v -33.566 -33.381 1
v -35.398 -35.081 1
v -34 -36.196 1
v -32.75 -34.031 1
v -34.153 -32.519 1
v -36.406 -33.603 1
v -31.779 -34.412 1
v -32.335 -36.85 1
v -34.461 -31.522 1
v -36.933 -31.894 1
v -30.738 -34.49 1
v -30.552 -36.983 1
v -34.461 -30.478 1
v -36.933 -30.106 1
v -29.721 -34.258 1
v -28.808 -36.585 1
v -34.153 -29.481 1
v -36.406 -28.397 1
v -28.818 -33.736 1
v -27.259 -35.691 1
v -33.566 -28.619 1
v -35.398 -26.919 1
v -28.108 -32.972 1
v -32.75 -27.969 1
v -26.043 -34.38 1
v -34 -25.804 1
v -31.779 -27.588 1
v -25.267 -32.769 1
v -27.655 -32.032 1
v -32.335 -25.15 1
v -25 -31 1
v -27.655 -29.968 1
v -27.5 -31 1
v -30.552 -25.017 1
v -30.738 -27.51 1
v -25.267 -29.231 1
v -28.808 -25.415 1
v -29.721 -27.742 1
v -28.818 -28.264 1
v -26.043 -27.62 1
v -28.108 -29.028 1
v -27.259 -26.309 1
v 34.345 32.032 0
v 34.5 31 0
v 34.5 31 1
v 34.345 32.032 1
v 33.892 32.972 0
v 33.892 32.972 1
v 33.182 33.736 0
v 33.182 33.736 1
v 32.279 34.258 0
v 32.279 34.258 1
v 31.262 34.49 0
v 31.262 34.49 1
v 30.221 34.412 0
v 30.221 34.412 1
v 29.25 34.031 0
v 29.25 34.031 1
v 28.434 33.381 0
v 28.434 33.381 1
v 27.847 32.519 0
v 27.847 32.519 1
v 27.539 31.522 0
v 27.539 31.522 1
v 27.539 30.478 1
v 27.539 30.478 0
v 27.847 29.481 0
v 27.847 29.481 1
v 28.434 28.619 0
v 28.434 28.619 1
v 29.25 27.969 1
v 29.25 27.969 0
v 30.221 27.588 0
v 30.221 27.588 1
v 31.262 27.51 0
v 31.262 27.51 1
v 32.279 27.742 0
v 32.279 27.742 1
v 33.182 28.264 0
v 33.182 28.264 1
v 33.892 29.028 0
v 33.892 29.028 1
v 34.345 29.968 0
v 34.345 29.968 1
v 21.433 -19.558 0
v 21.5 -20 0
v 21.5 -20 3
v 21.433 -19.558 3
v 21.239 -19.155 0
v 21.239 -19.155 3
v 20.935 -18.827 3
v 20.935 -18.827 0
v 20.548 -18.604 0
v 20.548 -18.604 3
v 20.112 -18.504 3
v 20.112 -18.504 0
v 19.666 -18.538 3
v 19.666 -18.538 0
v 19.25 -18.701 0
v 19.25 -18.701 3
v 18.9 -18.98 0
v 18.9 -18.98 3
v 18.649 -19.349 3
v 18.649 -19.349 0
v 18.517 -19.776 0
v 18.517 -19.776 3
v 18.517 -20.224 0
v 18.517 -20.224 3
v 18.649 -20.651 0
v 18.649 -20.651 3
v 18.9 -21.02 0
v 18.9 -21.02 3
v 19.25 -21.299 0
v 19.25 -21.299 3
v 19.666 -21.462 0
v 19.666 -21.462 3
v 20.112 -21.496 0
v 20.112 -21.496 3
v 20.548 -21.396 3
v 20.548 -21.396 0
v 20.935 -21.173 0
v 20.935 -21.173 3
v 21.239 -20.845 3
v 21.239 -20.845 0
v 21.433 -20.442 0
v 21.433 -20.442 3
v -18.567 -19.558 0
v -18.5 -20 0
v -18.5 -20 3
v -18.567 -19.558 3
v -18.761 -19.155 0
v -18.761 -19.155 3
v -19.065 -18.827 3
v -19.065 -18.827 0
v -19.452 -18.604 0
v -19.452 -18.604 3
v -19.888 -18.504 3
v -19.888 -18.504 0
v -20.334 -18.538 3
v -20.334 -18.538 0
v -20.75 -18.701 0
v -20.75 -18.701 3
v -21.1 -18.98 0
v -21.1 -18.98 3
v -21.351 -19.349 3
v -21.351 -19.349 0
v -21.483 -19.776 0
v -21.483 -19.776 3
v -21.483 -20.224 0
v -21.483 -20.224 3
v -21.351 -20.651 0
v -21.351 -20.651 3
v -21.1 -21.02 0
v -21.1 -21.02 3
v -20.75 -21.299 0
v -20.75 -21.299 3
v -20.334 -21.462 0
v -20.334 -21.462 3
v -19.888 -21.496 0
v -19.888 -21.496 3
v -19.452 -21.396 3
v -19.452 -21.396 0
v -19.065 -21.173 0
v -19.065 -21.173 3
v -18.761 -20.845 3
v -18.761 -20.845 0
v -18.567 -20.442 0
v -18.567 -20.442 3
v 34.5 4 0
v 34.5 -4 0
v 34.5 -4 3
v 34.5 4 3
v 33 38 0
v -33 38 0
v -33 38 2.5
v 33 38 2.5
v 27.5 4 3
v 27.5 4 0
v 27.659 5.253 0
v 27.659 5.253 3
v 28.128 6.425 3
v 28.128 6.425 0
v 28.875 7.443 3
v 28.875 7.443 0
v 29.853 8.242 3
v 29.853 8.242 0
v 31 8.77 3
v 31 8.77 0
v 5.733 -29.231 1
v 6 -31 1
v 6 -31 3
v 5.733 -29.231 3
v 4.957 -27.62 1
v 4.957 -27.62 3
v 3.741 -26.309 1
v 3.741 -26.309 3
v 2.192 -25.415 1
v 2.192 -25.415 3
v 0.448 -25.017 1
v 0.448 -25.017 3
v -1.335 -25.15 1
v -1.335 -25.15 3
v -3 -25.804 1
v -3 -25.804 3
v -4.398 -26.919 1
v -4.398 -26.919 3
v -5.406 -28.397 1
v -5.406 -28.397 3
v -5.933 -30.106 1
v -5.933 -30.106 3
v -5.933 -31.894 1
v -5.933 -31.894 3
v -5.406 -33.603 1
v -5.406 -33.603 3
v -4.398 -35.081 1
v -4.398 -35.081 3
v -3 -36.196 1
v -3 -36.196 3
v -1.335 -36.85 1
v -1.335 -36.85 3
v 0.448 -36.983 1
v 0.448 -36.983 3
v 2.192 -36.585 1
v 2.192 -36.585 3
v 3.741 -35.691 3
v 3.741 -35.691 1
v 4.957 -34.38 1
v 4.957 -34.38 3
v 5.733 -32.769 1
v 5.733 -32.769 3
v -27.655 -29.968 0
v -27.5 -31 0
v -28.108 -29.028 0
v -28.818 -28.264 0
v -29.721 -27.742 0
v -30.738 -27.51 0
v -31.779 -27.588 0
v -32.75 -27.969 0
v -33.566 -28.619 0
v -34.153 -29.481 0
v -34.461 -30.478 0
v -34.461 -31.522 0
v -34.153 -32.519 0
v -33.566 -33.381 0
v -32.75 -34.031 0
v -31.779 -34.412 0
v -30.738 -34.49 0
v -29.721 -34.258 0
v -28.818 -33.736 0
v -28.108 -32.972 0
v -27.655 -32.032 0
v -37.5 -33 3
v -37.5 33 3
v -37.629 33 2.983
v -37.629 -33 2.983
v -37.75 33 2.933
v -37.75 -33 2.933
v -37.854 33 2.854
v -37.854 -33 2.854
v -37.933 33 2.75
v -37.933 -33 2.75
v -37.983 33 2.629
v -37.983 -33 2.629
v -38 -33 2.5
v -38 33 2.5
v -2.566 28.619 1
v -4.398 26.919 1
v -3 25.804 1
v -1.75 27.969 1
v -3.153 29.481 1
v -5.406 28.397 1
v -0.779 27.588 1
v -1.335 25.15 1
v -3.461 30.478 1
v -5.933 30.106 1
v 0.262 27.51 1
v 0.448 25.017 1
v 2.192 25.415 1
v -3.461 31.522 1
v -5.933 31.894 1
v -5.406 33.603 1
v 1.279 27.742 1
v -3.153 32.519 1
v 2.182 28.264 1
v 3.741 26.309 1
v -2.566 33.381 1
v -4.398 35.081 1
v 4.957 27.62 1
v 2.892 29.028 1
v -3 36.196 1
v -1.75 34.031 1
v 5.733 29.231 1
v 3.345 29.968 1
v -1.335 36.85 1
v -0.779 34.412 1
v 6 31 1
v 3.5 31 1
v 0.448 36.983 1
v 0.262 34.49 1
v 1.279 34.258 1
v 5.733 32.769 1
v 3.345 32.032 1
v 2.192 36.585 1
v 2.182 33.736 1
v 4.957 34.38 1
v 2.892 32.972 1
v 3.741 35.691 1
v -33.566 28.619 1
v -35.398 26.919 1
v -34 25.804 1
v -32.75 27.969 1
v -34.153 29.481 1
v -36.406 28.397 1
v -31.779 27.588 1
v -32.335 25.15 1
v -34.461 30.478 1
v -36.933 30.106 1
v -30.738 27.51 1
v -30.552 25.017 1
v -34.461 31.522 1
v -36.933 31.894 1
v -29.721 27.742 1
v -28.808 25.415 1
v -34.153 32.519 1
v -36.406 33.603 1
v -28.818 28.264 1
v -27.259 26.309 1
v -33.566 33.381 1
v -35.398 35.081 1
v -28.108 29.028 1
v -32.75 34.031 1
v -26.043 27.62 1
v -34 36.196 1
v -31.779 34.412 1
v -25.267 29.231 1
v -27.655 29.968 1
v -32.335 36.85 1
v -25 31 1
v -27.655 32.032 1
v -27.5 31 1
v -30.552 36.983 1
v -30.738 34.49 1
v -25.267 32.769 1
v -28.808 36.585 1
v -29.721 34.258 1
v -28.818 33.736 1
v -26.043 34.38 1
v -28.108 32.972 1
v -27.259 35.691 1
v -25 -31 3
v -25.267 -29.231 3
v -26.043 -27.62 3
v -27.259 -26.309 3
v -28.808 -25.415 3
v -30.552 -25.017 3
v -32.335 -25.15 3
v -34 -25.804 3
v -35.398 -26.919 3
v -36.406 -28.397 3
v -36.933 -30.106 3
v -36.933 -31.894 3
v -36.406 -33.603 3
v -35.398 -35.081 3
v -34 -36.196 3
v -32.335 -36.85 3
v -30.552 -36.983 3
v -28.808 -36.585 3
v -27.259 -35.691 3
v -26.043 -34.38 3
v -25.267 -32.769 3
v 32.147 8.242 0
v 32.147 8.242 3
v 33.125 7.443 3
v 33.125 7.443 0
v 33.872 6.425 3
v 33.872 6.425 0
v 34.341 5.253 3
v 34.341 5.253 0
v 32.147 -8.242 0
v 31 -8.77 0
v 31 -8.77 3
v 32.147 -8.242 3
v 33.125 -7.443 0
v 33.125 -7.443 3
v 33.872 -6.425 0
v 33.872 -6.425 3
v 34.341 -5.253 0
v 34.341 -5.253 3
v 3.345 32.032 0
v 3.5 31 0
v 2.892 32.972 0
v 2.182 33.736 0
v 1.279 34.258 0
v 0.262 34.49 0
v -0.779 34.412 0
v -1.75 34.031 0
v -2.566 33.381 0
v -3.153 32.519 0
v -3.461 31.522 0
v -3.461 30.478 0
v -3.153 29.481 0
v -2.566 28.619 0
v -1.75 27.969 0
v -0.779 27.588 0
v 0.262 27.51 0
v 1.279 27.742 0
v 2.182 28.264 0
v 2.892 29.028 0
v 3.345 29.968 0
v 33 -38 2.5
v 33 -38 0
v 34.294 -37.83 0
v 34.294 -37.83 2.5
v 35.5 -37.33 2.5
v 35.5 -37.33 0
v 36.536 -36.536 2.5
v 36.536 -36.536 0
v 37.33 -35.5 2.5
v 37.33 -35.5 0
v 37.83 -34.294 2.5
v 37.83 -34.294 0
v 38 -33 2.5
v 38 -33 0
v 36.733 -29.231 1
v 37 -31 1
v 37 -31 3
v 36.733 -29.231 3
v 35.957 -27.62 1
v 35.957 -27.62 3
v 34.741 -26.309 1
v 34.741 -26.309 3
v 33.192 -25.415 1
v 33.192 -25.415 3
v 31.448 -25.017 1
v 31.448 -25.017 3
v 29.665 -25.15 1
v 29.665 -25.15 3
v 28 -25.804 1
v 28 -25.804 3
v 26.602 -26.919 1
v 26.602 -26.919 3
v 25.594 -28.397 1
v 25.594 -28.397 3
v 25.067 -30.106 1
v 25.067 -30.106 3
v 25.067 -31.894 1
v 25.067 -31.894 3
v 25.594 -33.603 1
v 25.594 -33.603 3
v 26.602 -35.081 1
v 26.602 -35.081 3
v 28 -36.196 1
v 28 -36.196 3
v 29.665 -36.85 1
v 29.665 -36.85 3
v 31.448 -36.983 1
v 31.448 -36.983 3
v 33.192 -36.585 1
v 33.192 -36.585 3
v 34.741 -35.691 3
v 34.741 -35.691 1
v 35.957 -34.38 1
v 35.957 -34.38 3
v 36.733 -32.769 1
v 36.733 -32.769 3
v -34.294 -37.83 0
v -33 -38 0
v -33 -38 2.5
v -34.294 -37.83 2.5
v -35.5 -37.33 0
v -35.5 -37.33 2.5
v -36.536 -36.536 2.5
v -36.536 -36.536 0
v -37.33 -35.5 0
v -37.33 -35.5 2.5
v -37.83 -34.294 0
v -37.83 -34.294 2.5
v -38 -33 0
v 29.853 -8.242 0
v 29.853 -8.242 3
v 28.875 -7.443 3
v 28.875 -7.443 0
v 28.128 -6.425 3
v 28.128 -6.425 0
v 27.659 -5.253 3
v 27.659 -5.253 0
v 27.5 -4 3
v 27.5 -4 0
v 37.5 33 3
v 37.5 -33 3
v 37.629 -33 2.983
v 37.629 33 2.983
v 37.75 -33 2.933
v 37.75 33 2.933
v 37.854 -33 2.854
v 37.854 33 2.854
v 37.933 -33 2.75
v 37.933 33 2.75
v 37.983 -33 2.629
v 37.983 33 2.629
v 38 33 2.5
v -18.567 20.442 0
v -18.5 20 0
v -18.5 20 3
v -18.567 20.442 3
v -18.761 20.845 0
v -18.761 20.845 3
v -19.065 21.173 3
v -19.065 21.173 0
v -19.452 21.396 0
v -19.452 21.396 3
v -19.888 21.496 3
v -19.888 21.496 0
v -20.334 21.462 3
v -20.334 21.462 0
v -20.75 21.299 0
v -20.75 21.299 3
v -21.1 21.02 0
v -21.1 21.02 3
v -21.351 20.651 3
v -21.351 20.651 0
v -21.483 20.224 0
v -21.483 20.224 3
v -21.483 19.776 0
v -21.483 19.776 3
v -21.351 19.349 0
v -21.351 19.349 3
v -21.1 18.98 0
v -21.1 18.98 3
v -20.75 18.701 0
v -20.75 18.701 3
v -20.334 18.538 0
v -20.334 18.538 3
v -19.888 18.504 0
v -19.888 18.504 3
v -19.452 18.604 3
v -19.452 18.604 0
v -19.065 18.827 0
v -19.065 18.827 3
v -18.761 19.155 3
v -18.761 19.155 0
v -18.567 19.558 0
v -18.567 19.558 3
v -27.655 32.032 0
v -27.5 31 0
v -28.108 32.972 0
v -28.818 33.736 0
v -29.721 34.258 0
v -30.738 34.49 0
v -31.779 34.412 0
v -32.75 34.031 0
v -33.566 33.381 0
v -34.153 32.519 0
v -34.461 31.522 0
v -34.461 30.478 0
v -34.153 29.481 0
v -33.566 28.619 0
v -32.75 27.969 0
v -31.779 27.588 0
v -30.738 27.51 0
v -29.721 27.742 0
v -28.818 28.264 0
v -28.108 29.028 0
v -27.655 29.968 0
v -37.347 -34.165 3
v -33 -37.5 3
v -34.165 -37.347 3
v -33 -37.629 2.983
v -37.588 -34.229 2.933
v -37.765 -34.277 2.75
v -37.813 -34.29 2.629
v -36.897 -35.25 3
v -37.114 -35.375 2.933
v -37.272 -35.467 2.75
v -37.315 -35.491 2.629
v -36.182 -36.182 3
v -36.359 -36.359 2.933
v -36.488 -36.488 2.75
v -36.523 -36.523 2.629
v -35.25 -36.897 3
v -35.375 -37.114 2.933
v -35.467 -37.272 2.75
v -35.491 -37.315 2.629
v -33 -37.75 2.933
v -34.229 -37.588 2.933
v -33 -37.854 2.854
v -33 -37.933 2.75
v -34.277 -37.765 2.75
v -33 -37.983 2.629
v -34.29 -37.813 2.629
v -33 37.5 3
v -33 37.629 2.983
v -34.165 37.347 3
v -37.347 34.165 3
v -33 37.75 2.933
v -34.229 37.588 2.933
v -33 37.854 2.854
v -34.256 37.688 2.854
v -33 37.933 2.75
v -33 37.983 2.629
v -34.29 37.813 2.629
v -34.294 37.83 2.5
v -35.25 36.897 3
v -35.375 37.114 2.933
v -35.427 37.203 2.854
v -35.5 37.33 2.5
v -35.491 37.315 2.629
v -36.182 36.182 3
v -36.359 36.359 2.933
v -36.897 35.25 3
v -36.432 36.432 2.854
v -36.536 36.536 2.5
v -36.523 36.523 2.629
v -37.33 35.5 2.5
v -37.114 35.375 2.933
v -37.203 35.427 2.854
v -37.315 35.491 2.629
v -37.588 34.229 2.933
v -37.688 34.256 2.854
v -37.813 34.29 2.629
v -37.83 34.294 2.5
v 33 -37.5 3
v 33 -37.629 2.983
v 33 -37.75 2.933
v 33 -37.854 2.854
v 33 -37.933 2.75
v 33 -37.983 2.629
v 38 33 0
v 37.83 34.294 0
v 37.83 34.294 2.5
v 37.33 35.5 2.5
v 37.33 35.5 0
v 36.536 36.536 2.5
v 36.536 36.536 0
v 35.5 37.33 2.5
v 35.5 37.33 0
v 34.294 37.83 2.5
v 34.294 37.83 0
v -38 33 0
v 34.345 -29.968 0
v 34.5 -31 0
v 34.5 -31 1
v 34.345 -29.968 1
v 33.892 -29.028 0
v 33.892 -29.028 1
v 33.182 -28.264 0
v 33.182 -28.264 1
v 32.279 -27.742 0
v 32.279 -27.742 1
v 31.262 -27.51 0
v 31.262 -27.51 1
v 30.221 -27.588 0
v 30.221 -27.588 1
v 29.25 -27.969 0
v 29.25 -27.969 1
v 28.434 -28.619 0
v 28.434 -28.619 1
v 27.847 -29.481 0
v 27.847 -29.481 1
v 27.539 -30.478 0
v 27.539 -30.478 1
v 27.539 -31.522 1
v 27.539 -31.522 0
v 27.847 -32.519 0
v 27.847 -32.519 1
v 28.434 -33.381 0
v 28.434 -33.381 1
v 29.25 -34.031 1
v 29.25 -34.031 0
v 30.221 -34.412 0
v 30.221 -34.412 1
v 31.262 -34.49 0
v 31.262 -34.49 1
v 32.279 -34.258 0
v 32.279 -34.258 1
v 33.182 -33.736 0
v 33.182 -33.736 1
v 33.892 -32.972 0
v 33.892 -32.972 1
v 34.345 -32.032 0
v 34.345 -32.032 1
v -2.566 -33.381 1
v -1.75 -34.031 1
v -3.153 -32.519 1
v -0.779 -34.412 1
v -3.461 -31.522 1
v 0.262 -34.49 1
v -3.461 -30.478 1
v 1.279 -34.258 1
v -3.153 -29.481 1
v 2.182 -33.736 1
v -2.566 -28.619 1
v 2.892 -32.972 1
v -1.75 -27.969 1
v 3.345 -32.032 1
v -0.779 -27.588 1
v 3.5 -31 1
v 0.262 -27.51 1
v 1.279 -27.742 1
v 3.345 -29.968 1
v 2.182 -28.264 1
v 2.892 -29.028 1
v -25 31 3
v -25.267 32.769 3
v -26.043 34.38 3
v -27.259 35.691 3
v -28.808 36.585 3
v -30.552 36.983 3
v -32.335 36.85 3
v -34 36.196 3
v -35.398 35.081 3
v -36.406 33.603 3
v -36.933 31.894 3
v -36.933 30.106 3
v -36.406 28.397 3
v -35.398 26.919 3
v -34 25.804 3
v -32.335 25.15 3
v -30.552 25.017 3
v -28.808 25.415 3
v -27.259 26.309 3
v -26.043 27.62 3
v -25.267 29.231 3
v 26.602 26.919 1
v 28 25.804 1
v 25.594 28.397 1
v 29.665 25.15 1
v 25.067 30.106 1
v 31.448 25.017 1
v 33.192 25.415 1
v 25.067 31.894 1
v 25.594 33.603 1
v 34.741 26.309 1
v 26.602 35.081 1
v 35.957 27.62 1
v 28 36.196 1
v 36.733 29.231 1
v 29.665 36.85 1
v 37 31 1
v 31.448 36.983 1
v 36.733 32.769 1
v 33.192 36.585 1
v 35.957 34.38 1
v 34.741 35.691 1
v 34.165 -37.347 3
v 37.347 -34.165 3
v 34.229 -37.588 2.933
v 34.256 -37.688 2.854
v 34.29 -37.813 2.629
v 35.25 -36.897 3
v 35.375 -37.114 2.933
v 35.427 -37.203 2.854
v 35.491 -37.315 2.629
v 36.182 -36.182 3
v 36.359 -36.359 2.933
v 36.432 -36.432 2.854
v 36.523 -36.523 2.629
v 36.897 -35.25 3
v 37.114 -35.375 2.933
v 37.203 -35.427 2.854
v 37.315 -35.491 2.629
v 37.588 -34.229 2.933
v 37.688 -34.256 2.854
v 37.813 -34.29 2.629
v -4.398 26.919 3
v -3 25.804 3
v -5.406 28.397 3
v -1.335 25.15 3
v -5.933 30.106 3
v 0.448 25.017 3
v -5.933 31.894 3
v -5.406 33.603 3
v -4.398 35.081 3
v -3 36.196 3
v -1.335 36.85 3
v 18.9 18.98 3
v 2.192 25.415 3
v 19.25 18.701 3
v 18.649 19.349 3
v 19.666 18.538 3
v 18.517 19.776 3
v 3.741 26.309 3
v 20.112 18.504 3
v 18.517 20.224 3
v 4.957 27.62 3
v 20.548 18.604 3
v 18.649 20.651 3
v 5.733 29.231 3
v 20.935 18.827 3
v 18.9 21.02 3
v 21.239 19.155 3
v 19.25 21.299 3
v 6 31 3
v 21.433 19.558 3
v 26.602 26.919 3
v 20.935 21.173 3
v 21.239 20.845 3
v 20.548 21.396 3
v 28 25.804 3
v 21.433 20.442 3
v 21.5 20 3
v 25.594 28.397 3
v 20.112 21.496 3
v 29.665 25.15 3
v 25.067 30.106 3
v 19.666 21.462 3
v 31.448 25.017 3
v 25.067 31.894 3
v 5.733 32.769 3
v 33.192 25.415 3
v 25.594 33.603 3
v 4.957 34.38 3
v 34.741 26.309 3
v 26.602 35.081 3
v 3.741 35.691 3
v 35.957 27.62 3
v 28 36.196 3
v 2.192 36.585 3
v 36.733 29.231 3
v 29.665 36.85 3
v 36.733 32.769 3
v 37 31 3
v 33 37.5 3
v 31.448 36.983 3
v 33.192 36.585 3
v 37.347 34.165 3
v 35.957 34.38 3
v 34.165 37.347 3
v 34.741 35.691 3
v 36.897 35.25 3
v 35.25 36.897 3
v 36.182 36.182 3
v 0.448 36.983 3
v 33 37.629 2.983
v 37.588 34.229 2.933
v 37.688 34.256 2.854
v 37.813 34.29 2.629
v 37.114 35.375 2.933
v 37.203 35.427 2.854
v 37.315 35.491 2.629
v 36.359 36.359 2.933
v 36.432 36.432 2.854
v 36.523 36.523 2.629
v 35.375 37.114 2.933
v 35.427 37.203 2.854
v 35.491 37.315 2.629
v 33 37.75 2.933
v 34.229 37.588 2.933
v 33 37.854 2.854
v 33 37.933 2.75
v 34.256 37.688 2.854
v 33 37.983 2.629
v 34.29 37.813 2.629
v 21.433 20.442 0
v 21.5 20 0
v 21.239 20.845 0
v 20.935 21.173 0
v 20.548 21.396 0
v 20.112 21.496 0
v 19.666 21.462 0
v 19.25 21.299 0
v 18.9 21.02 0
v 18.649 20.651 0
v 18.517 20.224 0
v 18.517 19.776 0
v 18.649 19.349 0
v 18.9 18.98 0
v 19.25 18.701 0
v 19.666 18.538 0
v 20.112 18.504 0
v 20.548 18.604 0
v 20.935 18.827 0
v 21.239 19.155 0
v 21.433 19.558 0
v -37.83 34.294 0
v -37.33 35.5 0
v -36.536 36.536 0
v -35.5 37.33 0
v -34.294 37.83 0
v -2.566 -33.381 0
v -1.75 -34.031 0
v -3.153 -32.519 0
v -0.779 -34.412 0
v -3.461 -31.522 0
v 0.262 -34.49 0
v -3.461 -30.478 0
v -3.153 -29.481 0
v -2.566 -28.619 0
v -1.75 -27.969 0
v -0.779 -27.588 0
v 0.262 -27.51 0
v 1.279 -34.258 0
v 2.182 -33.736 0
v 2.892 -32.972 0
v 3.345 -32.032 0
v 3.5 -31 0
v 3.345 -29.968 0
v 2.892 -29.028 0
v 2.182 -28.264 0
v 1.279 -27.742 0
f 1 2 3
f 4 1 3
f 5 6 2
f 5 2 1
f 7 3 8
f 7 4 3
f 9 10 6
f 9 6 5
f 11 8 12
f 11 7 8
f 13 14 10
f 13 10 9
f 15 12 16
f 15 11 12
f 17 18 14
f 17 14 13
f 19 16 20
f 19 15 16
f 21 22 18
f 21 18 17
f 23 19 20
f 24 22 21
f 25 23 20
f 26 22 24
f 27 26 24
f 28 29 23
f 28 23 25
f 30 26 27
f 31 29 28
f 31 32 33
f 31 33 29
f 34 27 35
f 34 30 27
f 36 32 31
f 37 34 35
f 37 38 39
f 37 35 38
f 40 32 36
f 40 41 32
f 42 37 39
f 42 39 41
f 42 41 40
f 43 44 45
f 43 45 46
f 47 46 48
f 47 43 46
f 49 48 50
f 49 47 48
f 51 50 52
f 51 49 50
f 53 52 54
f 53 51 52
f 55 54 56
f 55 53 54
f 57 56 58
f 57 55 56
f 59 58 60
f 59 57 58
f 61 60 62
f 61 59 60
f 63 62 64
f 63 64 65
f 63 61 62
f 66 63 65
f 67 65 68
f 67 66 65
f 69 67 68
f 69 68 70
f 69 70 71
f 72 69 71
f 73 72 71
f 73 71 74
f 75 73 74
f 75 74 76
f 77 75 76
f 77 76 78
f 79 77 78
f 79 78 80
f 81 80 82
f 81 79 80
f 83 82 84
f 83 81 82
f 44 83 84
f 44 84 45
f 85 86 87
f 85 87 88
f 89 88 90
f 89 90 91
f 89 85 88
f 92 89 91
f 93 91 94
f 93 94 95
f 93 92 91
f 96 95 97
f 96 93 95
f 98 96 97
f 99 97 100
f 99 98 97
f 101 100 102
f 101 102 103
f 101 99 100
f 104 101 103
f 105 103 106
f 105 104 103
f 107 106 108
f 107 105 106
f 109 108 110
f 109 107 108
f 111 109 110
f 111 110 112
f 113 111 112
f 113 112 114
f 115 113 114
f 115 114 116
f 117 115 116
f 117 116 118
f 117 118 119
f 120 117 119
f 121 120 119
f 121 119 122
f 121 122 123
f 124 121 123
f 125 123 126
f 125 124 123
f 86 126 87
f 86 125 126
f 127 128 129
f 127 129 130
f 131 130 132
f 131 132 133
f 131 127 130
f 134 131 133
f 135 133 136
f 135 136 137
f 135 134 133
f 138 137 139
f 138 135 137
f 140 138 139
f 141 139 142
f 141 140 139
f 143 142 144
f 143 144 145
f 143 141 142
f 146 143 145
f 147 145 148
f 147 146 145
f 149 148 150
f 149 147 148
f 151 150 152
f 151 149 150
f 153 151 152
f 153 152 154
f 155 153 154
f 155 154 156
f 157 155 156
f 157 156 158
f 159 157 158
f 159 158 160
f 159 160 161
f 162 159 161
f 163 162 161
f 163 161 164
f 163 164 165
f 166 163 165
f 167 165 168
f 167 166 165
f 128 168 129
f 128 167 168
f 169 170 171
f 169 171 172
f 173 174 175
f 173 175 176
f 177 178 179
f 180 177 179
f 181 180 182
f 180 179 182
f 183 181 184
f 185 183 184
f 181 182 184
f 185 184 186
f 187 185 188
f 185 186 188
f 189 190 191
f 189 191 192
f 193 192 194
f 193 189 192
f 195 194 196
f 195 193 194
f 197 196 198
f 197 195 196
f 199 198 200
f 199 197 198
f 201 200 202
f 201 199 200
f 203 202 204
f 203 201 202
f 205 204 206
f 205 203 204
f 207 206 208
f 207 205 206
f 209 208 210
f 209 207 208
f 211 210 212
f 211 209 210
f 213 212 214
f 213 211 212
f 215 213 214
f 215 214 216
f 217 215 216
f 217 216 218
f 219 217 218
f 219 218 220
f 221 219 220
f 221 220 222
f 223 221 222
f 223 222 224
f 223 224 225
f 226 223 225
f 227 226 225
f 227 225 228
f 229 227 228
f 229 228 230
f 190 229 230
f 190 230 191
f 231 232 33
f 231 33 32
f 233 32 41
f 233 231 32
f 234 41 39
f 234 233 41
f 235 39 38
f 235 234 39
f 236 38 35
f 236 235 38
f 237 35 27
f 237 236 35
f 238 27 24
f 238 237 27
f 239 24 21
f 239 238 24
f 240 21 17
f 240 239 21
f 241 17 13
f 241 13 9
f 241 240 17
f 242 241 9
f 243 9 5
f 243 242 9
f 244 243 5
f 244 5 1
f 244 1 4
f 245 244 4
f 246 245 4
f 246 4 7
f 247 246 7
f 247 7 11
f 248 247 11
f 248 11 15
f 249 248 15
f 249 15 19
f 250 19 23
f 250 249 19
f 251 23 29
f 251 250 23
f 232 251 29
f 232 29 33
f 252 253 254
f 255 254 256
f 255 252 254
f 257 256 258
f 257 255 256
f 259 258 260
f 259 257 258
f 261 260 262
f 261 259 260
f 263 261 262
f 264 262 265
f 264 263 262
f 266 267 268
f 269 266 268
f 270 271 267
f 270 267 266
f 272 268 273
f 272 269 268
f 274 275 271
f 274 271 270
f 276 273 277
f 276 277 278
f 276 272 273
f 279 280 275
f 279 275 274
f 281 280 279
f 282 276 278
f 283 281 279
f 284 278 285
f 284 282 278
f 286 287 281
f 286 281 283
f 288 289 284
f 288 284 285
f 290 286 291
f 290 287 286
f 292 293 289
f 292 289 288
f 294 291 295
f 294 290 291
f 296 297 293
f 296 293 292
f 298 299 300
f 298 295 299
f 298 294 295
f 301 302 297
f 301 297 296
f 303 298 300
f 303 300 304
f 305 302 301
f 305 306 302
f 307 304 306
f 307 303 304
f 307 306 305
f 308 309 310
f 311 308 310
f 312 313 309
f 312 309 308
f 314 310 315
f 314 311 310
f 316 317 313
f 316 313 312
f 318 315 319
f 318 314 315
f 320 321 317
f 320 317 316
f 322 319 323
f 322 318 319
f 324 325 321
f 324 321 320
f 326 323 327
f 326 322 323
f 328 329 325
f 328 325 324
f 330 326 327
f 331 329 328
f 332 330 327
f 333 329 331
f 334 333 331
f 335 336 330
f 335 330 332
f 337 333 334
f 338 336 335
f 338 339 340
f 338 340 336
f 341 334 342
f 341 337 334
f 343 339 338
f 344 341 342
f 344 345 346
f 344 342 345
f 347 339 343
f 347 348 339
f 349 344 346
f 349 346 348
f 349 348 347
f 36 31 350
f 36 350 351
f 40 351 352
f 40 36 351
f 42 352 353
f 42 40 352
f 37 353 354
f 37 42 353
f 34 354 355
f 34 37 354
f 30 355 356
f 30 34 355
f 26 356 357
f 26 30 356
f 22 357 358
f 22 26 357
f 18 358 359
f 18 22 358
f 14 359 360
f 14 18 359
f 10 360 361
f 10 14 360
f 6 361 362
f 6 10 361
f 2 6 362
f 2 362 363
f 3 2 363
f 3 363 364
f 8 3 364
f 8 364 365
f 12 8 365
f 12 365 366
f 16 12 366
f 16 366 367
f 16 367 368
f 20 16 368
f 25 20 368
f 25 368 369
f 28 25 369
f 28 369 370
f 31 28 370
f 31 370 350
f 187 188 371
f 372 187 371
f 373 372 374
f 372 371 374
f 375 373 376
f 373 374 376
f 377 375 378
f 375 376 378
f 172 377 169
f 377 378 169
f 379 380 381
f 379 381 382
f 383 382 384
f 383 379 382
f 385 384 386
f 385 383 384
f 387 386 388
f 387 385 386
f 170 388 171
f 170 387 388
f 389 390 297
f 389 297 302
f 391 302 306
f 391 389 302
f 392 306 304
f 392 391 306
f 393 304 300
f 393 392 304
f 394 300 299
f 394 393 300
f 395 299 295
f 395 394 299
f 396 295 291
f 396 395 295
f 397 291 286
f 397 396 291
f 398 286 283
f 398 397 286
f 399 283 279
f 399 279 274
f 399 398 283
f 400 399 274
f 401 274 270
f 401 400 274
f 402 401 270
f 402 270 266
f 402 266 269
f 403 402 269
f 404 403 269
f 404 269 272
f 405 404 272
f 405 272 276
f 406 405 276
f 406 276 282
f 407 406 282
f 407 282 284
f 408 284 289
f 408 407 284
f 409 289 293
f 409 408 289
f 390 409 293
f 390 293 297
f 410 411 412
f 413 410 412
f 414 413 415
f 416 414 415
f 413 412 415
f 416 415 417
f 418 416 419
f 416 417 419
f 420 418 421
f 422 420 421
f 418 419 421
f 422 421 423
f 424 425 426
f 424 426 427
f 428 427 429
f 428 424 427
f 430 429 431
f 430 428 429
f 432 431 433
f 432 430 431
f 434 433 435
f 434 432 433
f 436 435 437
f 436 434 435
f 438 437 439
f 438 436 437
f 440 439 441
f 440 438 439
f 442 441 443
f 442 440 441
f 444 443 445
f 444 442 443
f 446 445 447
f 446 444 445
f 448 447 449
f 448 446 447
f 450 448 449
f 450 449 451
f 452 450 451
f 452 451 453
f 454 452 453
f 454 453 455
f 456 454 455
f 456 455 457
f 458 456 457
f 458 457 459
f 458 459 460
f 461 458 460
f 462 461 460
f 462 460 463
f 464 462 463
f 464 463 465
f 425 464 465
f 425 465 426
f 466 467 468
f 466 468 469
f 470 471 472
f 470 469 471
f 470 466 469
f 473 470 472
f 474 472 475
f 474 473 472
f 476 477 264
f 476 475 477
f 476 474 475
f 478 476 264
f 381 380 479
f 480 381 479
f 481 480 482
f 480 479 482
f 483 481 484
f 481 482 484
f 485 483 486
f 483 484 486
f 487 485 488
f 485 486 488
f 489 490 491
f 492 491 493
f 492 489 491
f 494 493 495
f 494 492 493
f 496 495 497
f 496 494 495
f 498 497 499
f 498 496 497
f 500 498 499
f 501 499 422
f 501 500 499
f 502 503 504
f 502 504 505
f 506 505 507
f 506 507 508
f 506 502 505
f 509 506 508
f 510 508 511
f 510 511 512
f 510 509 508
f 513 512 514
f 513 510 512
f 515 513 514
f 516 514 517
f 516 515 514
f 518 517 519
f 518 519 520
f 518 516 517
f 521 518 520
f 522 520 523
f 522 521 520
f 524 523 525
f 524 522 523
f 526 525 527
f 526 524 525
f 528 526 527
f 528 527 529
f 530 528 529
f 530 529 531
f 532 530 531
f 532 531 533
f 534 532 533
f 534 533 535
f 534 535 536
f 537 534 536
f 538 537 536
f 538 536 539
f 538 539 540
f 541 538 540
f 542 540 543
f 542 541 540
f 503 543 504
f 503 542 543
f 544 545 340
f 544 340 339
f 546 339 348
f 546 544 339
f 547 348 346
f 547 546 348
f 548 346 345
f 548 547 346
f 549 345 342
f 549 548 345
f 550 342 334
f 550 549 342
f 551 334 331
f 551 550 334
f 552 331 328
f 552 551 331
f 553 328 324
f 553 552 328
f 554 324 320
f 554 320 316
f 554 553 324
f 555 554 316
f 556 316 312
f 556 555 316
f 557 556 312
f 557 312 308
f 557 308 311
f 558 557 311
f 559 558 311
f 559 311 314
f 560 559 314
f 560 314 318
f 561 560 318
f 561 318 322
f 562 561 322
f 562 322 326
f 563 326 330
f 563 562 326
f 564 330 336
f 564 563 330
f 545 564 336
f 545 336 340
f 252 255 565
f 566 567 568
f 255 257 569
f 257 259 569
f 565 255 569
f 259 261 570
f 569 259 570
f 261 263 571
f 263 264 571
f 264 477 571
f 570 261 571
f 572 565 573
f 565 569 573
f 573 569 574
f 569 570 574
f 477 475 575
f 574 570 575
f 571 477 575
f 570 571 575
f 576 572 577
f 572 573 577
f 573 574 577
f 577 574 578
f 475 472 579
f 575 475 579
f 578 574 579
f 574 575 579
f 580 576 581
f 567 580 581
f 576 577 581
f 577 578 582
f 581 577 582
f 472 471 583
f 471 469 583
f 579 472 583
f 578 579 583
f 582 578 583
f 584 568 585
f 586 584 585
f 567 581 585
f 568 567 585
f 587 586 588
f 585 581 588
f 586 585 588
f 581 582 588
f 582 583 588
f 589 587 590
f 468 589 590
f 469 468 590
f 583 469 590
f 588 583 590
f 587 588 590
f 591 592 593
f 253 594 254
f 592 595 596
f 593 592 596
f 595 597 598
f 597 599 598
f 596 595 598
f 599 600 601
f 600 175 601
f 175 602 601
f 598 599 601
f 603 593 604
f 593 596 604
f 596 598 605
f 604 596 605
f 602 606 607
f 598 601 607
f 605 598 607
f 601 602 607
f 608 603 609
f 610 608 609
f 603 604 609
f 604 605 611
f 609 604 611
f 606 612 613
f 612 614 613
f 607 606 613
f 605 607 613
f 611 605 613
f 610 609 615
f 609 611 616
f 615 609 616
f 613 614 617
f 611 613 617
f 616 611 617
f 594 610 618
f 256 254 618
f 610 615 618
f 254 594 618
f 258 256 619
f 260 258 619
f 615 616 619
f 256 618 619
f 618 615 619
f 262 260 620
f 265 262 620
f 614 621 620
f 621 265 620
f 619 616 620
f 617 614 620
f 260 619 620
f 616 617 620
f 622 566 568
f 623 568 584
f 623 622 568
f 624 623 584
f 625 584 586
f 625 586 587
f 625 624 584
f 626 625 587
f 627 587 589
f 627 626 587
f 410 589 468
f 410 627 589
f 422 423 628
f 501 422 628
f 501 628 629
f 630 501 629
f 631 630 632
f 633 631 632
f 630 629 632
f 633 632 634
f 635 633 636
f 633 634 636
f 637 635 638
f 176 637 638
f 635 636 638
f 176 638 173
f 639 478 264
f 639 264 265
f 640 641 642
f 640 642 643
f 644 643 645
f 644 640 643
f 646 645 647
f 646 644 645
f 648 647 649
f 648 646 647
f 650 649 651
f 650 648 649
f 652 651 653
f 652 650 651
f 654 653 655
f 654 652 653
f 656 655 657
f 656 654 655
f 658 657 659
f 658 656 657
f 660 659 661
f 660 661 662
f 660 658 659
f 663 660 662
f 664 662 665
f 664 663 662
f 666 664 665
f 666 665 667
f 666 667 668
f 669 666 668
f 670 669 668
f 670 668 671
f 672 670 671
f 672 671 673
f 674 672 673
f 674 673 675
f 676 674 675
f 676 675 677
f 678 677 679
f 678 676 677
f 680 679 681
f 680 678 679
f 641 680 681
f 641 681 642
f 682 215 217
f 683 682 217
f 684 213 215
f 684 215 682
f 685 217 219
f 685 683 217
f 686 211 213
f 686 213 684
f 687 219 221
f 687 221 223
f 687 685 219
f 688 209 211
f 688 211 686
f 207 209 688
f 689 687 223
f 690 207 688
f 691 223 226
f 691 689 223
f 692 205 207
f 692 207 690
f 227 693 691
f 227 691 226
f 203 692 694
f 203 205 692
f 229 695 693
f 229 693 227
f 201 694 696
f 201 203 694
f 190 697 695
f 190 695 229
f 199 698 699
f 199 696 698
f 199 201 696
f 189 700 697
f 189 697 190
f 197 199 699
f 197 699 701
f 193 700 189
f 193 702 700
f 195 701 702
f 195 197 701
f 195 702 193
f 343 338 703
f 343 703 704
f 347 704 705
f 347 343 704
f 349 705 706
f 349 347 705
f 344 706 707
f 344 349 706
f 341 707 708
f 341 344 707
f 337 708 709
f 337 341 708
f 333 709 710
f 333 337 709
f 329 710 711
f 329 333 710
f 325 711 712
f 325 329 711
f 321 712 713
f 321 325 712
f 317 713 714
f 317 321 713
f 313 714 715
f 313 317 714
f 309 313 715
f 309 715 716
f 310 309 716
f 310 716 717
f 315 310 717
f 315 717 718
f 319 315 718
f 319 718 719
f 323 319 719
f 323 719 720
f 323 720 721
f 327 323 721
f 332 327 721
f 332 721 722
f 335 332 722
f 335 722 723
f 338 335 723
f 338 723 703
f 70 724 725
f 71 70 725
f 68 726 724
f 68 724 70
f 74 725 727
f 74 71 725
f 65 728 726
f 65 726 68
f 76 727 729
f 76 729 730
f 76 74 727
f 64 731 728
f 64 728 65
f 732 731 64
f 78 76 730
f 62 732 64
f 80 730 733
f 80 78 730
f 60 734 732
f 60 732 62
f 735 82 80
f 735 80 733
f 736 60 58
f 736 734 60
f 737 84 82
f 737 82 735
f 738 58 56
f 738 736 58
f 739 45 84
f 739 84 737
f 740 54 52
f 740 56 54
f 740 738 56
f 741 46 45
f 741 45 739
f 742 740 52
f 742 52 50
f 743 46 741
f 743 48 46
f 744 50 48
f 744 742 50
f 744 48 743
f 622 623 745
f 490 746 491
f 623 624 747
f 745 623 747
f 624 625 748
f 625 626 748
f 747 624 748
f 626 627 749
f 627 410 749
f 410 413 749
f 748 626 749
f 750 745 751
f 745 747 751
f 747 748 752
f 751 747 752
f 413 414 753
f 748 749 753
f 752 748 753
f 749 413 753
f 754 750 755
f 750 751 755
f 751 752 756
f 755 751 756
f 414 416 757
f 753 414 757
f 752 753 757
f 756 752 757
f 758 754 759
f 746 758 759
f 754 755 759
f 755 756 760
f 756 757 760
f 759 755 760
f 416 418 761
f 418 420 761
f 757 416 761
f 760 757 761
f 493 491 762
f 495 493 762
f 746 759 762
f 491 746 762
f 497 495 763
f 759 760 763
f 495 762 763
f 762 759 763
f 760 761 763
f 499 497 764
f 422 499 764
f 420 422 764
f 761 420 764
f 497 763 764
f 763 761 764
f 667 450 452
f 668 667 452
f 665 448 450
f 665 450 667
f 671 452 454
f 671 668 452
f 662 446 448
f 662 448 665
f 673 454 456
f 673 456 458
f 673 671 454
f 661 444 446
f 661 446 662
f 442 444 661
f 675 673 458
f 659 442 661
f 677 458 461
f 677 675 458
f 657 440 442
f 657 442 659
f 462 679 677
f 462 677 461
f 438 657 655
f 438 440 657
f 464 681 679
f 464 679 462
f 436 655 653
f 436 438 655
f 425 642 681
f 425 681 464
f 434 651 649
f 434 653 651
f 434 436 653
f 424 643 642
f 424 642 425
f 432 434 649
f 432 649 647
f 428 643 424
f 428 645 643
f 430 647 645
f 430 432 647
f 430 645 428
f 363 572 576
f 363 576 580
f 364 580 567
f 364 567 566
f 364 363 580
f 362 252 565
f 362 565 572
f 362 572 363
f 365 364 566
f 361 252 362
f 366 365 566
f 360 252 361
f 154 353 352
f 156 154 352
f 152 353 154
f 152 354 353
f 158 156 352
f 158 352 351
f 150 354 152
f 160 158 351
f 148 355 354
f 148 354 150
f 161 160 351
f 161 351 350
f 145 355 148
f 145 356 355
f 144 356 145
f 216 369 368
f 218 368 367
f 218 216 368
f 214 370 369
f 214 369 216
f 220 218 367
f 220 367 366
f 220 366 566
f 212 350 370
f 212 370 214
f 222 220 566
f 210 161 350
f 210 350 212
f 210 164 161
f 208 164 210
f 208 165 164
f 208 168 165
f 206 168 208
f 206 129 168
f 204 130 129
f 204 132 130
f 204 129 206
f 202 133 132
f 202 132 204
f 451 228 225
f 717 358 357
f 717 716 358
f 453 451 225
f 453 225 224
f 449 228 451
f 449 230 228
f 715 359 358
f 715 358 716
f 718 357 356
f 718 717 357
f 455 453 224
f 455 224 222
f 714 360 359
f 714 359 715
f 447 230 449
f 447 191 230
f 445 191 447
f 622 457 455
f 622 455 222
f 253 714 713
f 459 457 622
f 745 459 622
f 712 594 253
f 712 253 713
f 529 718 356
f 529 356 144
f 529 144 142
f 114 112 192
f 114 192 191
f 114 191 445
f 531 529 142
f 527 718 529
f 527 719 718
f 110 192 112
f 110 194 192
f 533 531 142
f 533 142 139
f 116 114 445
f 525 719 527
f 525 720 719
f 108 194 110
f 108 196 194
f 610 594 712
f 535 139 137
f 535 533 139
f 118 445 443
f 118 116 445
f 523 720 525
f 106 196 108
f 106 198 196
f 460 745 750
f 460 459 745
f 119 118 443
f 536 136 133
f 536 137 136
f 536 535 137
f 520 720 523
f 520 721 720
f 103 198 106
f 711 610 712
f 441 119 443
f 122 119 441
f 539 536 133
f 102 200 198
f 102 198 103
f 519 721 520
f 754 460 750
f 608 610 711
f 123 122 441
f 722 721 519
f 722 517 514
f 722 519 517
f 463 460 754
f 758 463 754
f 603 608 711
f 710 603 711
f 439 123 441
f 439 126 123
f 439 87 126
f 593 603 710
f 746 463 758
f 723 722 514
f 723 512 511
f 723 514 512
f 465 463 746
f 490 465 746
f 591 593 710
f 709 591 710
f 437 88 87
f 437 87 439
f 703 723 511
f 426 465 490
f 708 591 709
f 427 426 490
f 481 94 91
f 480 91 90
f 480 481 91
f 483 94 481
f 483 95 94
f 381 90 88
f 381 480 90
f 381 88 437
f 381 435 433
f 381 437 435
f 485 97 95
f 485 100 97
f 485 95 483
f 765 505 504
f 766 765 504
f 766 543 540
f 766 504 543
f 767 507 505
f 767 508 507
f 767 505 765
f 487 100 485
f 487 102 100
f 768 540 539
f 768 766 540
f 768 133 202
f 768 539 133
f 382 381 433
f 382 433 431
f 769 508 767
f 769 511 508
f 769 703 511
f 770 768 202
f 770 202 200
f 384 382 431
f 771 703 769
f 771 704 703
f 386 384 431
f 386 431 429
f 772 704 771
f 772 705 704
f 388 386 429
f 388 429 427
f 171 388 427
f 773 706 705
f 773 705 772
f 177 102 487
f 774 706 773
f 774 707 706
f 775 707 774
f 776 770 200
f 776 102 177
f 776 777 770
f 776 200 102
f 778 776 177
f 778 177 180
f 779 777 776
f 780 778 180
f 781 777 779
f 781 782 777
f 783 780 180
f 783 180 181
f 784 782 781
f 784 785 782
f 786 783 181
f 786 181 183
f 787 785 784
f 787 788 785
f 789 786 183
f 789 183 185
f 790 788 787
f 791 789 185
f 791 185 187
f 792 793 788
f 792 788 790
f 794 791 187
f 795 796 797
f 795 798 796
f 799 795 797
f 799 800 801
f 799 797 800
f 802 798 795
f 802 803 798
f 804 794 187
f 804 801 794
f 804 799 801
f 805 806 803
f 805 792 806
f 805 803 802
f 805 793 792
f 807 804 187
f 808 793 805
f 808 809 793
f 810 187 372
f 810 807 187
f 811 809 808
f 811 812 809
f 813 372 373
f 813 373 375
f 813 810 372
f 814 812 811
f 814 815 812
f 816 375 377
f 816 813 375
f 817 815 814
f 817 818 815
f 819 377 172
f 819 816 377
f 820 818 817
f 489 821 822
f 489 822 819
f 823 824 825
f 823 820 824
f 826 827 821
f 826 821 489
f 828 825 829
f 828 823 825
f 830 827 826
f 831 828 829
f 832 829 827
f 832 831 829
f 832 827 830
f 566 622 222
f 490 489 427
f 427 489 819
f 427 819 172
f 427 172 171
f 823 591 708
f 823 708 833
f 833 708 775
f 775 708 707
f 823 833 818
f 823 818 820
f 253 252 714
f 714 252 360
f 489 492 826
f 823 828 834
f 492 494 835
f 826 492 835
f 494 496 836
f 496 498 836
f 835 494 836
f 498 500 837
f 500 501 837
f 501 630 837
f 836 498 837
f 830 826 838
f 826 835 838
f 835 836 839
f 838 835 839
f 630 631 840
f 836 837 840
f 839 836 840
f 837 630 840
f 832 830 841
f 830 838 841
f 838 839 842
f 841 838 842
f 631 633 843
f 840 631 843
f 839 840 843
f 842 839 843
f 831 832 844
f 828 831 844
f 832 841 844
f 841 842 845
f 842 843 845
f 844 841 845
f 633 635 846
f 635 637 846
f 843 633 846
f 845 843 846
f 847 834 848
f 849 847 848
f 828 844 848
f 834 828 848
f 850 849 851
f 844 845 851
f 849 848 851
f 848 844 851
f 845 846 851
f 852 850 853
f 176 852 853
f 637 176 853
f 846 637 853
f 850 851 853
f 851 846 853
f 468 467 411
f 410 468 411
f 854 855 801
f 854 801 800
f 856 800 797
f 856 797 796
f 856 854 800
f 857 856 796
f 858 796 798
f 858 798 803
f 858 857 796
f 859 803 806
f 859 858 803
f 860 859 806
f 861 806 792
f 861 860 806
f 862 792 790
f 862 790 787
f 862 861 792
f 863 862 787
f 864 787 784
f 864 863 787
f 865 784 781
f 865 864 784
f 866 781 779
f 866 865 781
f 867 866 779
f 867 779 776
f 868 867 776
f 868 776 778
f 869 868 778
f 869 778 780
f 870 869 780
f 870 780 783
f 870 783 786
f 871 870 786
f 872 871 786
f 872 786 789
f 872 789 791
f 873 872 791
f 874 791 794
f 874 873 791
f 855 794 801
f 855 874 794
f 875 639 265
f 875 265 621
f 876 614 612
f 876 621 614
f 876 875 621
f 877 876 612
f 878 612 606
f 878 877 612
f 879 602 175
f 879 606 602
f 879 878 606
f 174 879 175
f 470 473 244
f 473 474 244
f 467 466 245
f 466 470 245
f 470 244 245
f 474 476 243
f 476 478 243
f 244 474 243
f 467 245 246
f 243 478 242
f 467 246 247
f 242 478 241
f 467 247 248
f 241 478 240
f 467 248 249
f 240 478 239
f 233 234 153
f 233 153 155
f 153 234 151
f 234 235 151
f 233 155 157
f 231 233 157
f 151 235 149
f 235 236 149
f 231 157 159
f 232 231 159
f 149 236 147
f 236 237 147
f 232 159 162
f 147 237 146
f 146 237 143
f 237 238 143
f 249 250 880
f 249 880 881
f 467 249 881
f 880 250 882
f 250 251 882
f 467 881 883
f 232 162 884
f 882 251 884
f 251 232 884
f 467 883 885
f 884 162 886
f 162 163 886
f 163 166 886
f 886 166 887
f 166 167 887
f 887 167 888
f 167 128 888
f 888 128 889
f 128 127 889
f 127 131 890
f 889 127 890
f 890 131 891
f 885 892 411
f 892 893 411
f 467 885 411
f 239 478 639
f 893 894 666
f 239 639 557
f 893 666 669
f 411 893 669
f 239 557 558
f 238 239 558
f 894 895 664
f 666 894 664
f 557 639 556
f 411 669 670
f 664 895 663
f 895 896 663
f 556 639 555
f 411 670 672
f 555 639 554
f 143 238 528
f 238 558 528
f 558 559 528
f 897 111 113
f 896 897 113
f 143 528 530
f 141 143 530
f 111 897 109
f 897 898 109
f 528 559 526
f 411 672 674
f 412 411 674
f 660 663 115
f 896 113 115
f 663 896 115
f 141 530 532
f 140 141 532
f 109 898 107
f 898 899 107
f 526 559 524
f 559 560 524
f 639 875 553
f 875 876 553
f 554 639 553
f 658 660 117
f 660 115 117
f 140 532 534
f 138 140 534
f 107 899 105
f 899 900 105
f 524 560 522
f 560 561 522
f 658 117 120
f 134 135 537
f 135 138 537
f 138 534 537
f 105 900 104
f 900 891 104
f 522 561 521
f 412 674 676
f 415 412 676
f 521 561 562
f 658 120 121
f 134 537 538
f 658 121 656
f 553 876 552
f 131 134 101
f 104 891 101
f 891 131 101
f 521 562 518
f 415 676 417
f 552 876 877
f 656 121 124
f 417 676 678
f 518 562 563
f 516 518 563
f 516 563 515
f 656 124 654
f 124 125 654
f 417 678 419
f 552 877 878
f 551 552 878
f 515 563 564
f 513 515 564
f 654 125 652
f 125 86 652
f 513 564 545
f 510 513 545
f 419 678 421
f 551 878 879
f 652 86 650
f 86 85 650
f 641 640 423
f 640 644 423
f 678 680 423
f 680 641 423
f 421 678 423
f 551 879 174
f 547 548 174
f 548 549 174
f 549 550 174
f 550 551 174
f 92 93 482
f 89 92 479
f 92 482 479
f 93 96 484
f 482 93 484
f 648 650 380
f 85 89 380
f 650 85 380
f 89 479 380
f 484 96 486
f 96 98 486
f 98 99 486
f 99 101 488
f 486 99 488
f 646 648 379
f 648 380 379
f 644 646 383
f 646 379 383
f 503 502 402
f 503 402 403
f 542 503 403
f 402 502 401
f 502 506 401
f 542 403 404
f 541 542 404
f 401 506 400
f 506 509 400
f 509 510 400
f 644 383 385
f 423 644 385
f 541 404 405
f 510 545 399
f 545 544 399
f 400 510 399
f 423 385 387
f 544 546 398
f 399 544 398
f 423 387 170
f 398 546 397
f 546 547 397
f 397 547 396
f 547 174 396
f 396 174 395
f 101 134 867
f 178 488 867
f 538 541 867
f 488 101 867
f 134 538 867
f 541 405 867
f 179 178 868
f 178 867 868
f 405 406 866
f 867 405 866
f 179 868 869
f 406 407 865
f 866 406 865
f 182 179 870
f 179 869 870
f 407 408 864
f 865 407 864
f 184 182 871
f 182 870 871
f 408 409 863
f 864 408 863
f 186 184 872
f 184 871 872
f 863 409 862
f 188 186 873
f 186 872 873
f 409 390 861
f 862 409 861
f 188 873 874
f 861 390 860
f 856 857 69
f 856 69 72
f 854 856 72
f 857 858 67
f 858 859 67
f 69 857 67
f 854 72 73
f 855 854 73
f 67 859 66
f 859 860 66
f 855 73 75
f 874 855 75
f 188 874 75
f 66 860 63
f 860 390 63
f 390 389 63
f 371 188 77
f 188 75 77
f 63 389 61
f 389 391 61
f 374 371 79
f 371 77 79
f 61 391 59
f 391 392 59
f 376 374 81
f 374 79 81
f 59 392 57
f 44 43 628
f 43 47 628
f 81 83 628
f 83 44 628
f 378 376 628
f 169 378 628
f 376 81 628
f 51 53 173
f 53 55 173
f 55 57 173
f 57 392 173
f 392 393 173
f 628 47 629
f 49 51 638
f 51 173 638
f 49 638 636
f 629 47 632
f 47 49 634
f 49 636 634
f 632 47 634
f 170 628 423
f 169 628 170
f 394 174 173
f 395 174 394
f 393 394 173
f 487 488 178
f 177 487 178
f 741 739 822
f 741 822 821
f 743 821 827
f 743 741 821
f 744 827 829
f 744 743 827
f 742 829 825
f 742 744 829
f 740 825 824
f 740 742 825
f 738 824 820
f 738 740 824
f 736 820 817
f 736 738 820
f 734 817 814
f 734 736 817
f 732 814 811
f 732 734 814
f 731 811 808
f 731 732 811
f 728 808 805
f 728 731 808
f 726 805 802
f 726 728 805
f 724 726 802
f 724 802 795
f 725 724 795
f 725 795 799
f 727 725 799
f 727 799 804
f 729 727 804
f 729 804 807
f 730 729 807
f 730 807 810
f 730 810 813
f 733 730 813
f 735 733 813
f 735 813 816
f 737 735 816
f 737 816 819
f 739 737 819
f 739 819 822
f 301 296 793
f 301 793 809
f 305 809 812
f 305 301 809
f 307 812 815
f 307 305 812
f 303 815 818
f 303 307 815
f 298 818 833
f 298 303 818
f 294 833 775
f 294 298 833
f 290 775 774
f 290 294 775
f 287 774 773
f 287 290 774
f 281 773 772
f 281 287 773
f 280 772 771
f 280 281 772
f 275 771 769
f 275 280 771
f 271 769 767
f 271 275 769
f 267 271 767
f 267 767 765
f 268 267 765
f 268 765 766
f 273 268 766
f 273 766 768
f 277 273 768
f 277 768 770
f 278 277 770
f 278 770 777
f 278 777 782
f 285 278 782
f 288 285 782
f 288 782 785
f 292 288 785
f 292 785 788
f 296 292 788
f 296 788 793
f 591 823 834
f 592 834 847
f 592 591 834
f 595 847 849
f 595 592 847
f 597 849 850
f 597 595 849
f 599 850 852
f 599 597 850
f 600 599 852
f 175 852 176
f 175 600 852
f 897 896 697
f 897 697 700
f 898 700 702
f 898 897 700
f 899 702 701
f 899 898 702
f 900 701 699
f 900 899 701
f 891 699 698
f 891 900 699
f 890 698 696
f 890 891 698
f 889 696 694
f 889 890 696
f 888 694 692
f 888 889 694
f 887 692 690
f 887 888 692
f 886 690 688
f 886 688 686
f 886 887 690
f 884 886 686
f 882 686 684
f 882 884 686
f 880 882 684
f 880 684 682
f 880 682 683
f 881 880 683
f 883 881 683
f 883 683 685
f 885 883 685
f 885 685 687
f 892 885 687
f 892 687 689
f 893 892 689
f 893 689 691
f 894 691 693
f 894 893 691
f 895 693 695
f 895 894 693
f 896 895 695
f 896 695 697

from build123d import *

# Parameters (mm, degrees)
F0_W        = 76
F0_H        = 76
F0_R        = 6
F0_R_2      = 1.5
F0_W_2      = 7
F0_H_2      = 18
F1_DEPTH    = 3
F0_R_3      = 3.5
F2_DEPTH    = 1
F3_T1_DEPTH = 3
F3_T3_DEPTH = 28
F4_R        = 0.5


# Not quite as in the source:
# - a fillet or chamfer that OpenCascade refuses, or shapes differently, is made with other operations: its cross-section is extruded or revolved along the edge and cut away or added
# - a feature names something its author has since deleted; it is built from what else it names


with BuildPart() as f1:
    # F0 (on Top) → F1 (new body)
    with BuildSketch(Plane.XY):
        Rectangle(F0_W, F0_H)
        with Locations((-31, -31)):
            Circle(F0_R, mode=Mode.SUBTRACT)
        with Locations((-20, -20)):
            Circle(F0_R_2, mode=Mode.SUBTRACT)
        with Locations((0, -31)):
            Circle(F0_R, mode=Mode.SUBTRACT)
        with Locations((31, -31)):
            Circle(F0_R, mode=Mode.SUBTRACT)
        with Locations((20, -20)):
            Circle(F0_R_2, mode=Mode.SUBTRACT)
        with Locations((-20, 20)):
            Circle(F0_R_2, mode=Mode.SUBTRACT)
        with Locations((-31, 31)):
            Circle(F0_R, mode=Mode.SUBTRACT)
        with Locations((31, 0)):
            Rectangle(F0_W_2, F0_H_2, mode=Mode.SUBTRACT)
        with Locations((0, 31)):
            Circle(F0_R, mode=Mode.SUBTRACT)
        with Locations((20, 20)):
            Circle(F0_R_2, mode=Mode.SUBTRACT)
        with Locations((31, 31)):
            Circle(F0_R, mode=Mode.SUBTRACT)
    extrude(amount=F1_DEPTH)

    # F0 (on Top) → F2 (join)
    with BuildSketch(Plane.XY):
        with Locations((-31, 31)):
            Circle(F0_R)
        with Locations((-31, 31)):
            Circle(F0_R_3, mode=Mode.SUBTRACT)
        with Locations((31, 31)):
            Circle(F0_R)
        with Locations((31, 31)):
            Circle(F0_R_3, mode=Mode.SUBTRACT)
        with Locations((31, -31)):
            Circle(F0_R)
        with Locations((31, -31)):
            Circle(F0_R_3, mode=Mode.SUBTRACT)
        with Locations((-31, -31)):
            Circle(F0_R)
        with Locations((-31, -31)):
            Circle(F0_R_3, mode=Mode.SUBTRACT)
        with Locations((0, 31)):
            Circle(F0_R)
        with Locations((0, 31)):
            Circle(F0_R_3, mode=Mode.SUBTRACT)
        with Locations((0, -31)):
            Circle(F0_R)
        with Locations((0, -31)):
            Circle(F0_R_3, mode=Mode.SUBTRACT)
    extrude(amount=F2_DEPTH)

    # F3: fillet of radius 5 on 8 edges, made by hand

    # F3_s2 → F3_t1 (join)
    with BuildSketch(Plane.XY):
        with BuildLine():
            ThreePointArc((29.5, 9), (33.0355339059, 7.5355339059), (34.5, 4))
            Line((34.5, 4), (34.5, 9))
            Line((34.5, 9), (29.5, 9))
        make_face()
        with BuildLine():
            ThreePointArc((29.5, -9), (33.0355339059, -7.5355339059), (34.5, -4))
            Line((34.5, -4), (34.5, -9))
            Line((34.5, -9), (29.5, -9))
        make_face()
        with BuildLine():
            ThreePointArc((32.5, -9), (28.9644660941, -7.5355339059), (27.5, -4))
            Line((27.5, -4), (27.5, -9))
            Line((27.5, -9), (32.5, -9))
        make_face()
        with BuildLine():
            ThreePointArc((27.5, 4), (28.9644660941, 7.5355339059), (32.5, 9))
            Line((32.5, 9), (27.5, 9))
            Line((27.5, 9), (27.5, 4))
        make_face()
    extrude(amount=F3_T1_DEPTH)

    # F3_s4 → F3_t3 (cut)
    with BuildSketch(Plane.XY.offset(-12.5)):
        with BuildLine():
            ThreePointArc((-33, -38), (-36.5355339059, -36.5355339059), (-38, -33))
            Line((-38, -33), (-38, -38))
            Line((-38, -38), (-33, -38))
        make_face()
        with BuildLine():
            ThreePointArc((33, -38), (36.5355339059, -36.5355339059), (38, -33))
            Line((38, -33), (38, -38))
            Line((38, -38), (33, -38))
        make_face()
        with BuildLine():
            ThreePointArc((38, 33), (36.5355339059, 36.5355339059), (33, 38))
            Line((33, 38), (38, 38))
            Line((38, 38), (38, 33))
        make_face()
        with BuildLine():
            ThreePointArc((-38, 33), (-36.5355339059, 36.5355339059), (-33, 38))
            Line((-33, 38), (-38, 38))
            Line((-38, 38), (-38, 33))
        make_face()
    extrude(amount=F3_T3_DEPTH, mode=Mode.SUBTRACT)

    # F4
    f4_edges = [f1.edges().sort_by_distance(p)[0] for p in [
        (0, -38, 3),
    ]]
    fillet(f4_edges, radius=F4_R)


solid = f1.part
